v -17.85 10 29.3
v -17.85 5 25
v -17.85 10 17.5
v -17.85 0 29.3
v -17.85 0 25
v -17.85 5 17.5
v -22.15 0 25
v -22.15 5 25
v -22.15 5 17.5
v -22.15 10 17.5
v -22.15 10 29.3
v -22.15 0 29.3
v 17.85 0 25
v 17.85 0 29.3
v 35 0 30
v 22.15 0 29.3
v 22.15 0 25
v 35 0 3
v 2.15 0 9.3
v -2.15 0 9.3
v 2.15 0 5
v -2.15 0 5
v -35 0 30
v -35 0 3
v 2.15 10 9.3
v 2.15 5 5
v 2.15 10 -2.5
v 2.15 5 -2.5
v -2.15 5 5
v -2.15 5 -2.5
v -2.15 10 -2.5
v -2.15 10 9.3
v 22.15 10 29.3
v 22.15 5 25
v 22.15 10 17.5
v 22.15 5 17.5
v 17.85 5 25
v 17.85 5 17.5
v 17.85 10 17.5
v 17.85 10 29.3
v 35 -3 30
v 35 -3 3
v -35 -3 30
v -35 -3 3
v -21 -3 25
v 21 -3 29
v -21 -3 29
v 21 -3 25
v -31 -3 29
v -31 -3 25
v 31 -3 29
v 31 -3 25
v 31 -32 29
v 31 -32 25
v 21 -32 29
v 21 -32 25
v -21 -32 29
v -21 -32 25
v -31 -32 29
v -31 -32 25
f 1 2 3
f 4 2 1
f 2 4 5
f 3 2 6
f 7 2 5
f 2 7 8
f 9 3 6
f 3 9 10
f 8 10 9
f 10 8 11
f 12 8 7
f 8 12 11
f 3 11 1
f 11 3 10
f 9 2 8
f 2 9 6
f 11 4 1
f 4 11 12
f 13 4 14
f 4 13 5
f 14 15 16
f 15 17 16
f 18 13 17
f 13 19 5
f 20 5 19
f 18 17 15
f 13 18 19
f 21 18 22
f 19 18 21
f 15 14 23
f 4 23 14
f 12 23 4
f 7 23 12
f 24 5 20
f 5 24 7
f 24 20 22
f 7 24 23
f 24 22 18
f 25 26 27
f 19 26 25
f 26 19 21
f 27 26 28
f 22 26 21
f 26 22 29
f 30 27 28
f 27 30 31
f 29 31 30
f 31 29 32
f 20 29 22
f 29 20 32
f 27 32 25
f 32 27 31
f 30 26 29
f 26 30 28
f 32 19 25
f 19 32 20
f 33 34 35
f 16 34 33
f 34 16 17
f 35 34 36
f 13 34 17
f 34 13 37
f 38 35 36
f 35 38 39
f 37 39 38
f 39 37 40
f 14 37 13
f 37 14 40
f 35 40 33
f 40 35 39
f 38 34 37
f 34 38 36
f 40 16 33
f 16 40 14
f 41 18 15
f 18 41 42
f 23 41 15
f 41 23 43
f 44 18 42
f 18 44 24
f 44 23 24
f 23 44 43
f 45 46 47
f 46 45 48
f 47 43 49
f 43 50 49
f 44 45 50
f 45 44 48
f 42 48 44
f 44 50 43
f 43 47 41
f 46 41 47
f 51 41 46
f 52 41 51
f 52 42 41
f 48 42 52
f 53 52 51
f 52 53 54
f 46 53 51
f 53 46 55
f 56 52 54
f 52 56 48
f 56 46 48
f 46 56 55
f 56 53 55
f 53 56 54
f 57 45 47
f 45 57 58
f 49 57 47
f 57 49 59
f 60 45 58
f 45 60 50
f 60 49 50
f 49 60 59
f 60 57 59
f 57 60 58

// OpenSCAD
// file: ../../modules/skadis.scad
ikea_skadis_hole_w = 4.3;
ikea_skadis_hook_depth = 5;
ikea_skadis_hole_h = 7.5;
ikea_skadis_holes_dist = 80;
ikea_skadis_holes_horiz_dist = 40;

module skadis_hook() {
    color("green")
    translate([0,ikea_skadis_hook_depth,-ikea_skadis_hole_h]) cube([ikea_skadis_hole_w,ikea_skadis_hook_depth,ikea_skadis_hole_h ]);

    color("violet")
    translate([0,0,0]) cube([ikea_skadis_hole_w,ikea_skadis_hook_depth*2,ikea_skadis_hole_w ]);
}

module skadis_double_hooks() {
    skadis_hook();
    
    translate([0,0,ikea_skadis_holes_dist]) skadis_hook();
    
    color("yellow")
    translate([0,-ikea_skadis_hook_depth,0])
    cube([ikea_skadis_hole_w,ikea_skadis_hook_depth,ikea_skadis_holes_dist + ikea_skadis_hole_w]);
}

module skadis_triple_horiz_hooks() {
    translate([-20 - ikea_skadis_hole_w / 2,0,0]) union() {
        skadis_hook();
        translate([20,0,-20]) skadis_hook();
        translate([40,0,0]) skadis_hook();
    }
}

//skadis_double_hooks();
//skadis_triple_horiz_hooks();
// main file
include <../../modules/skadis.scad>;

w = 42;

translate([-w/2 - 14,-3,3]) cube([w + 28,3,27]);

//color("red") translate([-w/2,-10,20]) cube([w, 10, 10]);

translate([0,0,25]) skadis_triple_horiz_hooks();
translate([w/2,-32,25]) cube([10, 29, 4]);
translate([-w/2-10,-32,25]) cube([10, 29, 4]);
